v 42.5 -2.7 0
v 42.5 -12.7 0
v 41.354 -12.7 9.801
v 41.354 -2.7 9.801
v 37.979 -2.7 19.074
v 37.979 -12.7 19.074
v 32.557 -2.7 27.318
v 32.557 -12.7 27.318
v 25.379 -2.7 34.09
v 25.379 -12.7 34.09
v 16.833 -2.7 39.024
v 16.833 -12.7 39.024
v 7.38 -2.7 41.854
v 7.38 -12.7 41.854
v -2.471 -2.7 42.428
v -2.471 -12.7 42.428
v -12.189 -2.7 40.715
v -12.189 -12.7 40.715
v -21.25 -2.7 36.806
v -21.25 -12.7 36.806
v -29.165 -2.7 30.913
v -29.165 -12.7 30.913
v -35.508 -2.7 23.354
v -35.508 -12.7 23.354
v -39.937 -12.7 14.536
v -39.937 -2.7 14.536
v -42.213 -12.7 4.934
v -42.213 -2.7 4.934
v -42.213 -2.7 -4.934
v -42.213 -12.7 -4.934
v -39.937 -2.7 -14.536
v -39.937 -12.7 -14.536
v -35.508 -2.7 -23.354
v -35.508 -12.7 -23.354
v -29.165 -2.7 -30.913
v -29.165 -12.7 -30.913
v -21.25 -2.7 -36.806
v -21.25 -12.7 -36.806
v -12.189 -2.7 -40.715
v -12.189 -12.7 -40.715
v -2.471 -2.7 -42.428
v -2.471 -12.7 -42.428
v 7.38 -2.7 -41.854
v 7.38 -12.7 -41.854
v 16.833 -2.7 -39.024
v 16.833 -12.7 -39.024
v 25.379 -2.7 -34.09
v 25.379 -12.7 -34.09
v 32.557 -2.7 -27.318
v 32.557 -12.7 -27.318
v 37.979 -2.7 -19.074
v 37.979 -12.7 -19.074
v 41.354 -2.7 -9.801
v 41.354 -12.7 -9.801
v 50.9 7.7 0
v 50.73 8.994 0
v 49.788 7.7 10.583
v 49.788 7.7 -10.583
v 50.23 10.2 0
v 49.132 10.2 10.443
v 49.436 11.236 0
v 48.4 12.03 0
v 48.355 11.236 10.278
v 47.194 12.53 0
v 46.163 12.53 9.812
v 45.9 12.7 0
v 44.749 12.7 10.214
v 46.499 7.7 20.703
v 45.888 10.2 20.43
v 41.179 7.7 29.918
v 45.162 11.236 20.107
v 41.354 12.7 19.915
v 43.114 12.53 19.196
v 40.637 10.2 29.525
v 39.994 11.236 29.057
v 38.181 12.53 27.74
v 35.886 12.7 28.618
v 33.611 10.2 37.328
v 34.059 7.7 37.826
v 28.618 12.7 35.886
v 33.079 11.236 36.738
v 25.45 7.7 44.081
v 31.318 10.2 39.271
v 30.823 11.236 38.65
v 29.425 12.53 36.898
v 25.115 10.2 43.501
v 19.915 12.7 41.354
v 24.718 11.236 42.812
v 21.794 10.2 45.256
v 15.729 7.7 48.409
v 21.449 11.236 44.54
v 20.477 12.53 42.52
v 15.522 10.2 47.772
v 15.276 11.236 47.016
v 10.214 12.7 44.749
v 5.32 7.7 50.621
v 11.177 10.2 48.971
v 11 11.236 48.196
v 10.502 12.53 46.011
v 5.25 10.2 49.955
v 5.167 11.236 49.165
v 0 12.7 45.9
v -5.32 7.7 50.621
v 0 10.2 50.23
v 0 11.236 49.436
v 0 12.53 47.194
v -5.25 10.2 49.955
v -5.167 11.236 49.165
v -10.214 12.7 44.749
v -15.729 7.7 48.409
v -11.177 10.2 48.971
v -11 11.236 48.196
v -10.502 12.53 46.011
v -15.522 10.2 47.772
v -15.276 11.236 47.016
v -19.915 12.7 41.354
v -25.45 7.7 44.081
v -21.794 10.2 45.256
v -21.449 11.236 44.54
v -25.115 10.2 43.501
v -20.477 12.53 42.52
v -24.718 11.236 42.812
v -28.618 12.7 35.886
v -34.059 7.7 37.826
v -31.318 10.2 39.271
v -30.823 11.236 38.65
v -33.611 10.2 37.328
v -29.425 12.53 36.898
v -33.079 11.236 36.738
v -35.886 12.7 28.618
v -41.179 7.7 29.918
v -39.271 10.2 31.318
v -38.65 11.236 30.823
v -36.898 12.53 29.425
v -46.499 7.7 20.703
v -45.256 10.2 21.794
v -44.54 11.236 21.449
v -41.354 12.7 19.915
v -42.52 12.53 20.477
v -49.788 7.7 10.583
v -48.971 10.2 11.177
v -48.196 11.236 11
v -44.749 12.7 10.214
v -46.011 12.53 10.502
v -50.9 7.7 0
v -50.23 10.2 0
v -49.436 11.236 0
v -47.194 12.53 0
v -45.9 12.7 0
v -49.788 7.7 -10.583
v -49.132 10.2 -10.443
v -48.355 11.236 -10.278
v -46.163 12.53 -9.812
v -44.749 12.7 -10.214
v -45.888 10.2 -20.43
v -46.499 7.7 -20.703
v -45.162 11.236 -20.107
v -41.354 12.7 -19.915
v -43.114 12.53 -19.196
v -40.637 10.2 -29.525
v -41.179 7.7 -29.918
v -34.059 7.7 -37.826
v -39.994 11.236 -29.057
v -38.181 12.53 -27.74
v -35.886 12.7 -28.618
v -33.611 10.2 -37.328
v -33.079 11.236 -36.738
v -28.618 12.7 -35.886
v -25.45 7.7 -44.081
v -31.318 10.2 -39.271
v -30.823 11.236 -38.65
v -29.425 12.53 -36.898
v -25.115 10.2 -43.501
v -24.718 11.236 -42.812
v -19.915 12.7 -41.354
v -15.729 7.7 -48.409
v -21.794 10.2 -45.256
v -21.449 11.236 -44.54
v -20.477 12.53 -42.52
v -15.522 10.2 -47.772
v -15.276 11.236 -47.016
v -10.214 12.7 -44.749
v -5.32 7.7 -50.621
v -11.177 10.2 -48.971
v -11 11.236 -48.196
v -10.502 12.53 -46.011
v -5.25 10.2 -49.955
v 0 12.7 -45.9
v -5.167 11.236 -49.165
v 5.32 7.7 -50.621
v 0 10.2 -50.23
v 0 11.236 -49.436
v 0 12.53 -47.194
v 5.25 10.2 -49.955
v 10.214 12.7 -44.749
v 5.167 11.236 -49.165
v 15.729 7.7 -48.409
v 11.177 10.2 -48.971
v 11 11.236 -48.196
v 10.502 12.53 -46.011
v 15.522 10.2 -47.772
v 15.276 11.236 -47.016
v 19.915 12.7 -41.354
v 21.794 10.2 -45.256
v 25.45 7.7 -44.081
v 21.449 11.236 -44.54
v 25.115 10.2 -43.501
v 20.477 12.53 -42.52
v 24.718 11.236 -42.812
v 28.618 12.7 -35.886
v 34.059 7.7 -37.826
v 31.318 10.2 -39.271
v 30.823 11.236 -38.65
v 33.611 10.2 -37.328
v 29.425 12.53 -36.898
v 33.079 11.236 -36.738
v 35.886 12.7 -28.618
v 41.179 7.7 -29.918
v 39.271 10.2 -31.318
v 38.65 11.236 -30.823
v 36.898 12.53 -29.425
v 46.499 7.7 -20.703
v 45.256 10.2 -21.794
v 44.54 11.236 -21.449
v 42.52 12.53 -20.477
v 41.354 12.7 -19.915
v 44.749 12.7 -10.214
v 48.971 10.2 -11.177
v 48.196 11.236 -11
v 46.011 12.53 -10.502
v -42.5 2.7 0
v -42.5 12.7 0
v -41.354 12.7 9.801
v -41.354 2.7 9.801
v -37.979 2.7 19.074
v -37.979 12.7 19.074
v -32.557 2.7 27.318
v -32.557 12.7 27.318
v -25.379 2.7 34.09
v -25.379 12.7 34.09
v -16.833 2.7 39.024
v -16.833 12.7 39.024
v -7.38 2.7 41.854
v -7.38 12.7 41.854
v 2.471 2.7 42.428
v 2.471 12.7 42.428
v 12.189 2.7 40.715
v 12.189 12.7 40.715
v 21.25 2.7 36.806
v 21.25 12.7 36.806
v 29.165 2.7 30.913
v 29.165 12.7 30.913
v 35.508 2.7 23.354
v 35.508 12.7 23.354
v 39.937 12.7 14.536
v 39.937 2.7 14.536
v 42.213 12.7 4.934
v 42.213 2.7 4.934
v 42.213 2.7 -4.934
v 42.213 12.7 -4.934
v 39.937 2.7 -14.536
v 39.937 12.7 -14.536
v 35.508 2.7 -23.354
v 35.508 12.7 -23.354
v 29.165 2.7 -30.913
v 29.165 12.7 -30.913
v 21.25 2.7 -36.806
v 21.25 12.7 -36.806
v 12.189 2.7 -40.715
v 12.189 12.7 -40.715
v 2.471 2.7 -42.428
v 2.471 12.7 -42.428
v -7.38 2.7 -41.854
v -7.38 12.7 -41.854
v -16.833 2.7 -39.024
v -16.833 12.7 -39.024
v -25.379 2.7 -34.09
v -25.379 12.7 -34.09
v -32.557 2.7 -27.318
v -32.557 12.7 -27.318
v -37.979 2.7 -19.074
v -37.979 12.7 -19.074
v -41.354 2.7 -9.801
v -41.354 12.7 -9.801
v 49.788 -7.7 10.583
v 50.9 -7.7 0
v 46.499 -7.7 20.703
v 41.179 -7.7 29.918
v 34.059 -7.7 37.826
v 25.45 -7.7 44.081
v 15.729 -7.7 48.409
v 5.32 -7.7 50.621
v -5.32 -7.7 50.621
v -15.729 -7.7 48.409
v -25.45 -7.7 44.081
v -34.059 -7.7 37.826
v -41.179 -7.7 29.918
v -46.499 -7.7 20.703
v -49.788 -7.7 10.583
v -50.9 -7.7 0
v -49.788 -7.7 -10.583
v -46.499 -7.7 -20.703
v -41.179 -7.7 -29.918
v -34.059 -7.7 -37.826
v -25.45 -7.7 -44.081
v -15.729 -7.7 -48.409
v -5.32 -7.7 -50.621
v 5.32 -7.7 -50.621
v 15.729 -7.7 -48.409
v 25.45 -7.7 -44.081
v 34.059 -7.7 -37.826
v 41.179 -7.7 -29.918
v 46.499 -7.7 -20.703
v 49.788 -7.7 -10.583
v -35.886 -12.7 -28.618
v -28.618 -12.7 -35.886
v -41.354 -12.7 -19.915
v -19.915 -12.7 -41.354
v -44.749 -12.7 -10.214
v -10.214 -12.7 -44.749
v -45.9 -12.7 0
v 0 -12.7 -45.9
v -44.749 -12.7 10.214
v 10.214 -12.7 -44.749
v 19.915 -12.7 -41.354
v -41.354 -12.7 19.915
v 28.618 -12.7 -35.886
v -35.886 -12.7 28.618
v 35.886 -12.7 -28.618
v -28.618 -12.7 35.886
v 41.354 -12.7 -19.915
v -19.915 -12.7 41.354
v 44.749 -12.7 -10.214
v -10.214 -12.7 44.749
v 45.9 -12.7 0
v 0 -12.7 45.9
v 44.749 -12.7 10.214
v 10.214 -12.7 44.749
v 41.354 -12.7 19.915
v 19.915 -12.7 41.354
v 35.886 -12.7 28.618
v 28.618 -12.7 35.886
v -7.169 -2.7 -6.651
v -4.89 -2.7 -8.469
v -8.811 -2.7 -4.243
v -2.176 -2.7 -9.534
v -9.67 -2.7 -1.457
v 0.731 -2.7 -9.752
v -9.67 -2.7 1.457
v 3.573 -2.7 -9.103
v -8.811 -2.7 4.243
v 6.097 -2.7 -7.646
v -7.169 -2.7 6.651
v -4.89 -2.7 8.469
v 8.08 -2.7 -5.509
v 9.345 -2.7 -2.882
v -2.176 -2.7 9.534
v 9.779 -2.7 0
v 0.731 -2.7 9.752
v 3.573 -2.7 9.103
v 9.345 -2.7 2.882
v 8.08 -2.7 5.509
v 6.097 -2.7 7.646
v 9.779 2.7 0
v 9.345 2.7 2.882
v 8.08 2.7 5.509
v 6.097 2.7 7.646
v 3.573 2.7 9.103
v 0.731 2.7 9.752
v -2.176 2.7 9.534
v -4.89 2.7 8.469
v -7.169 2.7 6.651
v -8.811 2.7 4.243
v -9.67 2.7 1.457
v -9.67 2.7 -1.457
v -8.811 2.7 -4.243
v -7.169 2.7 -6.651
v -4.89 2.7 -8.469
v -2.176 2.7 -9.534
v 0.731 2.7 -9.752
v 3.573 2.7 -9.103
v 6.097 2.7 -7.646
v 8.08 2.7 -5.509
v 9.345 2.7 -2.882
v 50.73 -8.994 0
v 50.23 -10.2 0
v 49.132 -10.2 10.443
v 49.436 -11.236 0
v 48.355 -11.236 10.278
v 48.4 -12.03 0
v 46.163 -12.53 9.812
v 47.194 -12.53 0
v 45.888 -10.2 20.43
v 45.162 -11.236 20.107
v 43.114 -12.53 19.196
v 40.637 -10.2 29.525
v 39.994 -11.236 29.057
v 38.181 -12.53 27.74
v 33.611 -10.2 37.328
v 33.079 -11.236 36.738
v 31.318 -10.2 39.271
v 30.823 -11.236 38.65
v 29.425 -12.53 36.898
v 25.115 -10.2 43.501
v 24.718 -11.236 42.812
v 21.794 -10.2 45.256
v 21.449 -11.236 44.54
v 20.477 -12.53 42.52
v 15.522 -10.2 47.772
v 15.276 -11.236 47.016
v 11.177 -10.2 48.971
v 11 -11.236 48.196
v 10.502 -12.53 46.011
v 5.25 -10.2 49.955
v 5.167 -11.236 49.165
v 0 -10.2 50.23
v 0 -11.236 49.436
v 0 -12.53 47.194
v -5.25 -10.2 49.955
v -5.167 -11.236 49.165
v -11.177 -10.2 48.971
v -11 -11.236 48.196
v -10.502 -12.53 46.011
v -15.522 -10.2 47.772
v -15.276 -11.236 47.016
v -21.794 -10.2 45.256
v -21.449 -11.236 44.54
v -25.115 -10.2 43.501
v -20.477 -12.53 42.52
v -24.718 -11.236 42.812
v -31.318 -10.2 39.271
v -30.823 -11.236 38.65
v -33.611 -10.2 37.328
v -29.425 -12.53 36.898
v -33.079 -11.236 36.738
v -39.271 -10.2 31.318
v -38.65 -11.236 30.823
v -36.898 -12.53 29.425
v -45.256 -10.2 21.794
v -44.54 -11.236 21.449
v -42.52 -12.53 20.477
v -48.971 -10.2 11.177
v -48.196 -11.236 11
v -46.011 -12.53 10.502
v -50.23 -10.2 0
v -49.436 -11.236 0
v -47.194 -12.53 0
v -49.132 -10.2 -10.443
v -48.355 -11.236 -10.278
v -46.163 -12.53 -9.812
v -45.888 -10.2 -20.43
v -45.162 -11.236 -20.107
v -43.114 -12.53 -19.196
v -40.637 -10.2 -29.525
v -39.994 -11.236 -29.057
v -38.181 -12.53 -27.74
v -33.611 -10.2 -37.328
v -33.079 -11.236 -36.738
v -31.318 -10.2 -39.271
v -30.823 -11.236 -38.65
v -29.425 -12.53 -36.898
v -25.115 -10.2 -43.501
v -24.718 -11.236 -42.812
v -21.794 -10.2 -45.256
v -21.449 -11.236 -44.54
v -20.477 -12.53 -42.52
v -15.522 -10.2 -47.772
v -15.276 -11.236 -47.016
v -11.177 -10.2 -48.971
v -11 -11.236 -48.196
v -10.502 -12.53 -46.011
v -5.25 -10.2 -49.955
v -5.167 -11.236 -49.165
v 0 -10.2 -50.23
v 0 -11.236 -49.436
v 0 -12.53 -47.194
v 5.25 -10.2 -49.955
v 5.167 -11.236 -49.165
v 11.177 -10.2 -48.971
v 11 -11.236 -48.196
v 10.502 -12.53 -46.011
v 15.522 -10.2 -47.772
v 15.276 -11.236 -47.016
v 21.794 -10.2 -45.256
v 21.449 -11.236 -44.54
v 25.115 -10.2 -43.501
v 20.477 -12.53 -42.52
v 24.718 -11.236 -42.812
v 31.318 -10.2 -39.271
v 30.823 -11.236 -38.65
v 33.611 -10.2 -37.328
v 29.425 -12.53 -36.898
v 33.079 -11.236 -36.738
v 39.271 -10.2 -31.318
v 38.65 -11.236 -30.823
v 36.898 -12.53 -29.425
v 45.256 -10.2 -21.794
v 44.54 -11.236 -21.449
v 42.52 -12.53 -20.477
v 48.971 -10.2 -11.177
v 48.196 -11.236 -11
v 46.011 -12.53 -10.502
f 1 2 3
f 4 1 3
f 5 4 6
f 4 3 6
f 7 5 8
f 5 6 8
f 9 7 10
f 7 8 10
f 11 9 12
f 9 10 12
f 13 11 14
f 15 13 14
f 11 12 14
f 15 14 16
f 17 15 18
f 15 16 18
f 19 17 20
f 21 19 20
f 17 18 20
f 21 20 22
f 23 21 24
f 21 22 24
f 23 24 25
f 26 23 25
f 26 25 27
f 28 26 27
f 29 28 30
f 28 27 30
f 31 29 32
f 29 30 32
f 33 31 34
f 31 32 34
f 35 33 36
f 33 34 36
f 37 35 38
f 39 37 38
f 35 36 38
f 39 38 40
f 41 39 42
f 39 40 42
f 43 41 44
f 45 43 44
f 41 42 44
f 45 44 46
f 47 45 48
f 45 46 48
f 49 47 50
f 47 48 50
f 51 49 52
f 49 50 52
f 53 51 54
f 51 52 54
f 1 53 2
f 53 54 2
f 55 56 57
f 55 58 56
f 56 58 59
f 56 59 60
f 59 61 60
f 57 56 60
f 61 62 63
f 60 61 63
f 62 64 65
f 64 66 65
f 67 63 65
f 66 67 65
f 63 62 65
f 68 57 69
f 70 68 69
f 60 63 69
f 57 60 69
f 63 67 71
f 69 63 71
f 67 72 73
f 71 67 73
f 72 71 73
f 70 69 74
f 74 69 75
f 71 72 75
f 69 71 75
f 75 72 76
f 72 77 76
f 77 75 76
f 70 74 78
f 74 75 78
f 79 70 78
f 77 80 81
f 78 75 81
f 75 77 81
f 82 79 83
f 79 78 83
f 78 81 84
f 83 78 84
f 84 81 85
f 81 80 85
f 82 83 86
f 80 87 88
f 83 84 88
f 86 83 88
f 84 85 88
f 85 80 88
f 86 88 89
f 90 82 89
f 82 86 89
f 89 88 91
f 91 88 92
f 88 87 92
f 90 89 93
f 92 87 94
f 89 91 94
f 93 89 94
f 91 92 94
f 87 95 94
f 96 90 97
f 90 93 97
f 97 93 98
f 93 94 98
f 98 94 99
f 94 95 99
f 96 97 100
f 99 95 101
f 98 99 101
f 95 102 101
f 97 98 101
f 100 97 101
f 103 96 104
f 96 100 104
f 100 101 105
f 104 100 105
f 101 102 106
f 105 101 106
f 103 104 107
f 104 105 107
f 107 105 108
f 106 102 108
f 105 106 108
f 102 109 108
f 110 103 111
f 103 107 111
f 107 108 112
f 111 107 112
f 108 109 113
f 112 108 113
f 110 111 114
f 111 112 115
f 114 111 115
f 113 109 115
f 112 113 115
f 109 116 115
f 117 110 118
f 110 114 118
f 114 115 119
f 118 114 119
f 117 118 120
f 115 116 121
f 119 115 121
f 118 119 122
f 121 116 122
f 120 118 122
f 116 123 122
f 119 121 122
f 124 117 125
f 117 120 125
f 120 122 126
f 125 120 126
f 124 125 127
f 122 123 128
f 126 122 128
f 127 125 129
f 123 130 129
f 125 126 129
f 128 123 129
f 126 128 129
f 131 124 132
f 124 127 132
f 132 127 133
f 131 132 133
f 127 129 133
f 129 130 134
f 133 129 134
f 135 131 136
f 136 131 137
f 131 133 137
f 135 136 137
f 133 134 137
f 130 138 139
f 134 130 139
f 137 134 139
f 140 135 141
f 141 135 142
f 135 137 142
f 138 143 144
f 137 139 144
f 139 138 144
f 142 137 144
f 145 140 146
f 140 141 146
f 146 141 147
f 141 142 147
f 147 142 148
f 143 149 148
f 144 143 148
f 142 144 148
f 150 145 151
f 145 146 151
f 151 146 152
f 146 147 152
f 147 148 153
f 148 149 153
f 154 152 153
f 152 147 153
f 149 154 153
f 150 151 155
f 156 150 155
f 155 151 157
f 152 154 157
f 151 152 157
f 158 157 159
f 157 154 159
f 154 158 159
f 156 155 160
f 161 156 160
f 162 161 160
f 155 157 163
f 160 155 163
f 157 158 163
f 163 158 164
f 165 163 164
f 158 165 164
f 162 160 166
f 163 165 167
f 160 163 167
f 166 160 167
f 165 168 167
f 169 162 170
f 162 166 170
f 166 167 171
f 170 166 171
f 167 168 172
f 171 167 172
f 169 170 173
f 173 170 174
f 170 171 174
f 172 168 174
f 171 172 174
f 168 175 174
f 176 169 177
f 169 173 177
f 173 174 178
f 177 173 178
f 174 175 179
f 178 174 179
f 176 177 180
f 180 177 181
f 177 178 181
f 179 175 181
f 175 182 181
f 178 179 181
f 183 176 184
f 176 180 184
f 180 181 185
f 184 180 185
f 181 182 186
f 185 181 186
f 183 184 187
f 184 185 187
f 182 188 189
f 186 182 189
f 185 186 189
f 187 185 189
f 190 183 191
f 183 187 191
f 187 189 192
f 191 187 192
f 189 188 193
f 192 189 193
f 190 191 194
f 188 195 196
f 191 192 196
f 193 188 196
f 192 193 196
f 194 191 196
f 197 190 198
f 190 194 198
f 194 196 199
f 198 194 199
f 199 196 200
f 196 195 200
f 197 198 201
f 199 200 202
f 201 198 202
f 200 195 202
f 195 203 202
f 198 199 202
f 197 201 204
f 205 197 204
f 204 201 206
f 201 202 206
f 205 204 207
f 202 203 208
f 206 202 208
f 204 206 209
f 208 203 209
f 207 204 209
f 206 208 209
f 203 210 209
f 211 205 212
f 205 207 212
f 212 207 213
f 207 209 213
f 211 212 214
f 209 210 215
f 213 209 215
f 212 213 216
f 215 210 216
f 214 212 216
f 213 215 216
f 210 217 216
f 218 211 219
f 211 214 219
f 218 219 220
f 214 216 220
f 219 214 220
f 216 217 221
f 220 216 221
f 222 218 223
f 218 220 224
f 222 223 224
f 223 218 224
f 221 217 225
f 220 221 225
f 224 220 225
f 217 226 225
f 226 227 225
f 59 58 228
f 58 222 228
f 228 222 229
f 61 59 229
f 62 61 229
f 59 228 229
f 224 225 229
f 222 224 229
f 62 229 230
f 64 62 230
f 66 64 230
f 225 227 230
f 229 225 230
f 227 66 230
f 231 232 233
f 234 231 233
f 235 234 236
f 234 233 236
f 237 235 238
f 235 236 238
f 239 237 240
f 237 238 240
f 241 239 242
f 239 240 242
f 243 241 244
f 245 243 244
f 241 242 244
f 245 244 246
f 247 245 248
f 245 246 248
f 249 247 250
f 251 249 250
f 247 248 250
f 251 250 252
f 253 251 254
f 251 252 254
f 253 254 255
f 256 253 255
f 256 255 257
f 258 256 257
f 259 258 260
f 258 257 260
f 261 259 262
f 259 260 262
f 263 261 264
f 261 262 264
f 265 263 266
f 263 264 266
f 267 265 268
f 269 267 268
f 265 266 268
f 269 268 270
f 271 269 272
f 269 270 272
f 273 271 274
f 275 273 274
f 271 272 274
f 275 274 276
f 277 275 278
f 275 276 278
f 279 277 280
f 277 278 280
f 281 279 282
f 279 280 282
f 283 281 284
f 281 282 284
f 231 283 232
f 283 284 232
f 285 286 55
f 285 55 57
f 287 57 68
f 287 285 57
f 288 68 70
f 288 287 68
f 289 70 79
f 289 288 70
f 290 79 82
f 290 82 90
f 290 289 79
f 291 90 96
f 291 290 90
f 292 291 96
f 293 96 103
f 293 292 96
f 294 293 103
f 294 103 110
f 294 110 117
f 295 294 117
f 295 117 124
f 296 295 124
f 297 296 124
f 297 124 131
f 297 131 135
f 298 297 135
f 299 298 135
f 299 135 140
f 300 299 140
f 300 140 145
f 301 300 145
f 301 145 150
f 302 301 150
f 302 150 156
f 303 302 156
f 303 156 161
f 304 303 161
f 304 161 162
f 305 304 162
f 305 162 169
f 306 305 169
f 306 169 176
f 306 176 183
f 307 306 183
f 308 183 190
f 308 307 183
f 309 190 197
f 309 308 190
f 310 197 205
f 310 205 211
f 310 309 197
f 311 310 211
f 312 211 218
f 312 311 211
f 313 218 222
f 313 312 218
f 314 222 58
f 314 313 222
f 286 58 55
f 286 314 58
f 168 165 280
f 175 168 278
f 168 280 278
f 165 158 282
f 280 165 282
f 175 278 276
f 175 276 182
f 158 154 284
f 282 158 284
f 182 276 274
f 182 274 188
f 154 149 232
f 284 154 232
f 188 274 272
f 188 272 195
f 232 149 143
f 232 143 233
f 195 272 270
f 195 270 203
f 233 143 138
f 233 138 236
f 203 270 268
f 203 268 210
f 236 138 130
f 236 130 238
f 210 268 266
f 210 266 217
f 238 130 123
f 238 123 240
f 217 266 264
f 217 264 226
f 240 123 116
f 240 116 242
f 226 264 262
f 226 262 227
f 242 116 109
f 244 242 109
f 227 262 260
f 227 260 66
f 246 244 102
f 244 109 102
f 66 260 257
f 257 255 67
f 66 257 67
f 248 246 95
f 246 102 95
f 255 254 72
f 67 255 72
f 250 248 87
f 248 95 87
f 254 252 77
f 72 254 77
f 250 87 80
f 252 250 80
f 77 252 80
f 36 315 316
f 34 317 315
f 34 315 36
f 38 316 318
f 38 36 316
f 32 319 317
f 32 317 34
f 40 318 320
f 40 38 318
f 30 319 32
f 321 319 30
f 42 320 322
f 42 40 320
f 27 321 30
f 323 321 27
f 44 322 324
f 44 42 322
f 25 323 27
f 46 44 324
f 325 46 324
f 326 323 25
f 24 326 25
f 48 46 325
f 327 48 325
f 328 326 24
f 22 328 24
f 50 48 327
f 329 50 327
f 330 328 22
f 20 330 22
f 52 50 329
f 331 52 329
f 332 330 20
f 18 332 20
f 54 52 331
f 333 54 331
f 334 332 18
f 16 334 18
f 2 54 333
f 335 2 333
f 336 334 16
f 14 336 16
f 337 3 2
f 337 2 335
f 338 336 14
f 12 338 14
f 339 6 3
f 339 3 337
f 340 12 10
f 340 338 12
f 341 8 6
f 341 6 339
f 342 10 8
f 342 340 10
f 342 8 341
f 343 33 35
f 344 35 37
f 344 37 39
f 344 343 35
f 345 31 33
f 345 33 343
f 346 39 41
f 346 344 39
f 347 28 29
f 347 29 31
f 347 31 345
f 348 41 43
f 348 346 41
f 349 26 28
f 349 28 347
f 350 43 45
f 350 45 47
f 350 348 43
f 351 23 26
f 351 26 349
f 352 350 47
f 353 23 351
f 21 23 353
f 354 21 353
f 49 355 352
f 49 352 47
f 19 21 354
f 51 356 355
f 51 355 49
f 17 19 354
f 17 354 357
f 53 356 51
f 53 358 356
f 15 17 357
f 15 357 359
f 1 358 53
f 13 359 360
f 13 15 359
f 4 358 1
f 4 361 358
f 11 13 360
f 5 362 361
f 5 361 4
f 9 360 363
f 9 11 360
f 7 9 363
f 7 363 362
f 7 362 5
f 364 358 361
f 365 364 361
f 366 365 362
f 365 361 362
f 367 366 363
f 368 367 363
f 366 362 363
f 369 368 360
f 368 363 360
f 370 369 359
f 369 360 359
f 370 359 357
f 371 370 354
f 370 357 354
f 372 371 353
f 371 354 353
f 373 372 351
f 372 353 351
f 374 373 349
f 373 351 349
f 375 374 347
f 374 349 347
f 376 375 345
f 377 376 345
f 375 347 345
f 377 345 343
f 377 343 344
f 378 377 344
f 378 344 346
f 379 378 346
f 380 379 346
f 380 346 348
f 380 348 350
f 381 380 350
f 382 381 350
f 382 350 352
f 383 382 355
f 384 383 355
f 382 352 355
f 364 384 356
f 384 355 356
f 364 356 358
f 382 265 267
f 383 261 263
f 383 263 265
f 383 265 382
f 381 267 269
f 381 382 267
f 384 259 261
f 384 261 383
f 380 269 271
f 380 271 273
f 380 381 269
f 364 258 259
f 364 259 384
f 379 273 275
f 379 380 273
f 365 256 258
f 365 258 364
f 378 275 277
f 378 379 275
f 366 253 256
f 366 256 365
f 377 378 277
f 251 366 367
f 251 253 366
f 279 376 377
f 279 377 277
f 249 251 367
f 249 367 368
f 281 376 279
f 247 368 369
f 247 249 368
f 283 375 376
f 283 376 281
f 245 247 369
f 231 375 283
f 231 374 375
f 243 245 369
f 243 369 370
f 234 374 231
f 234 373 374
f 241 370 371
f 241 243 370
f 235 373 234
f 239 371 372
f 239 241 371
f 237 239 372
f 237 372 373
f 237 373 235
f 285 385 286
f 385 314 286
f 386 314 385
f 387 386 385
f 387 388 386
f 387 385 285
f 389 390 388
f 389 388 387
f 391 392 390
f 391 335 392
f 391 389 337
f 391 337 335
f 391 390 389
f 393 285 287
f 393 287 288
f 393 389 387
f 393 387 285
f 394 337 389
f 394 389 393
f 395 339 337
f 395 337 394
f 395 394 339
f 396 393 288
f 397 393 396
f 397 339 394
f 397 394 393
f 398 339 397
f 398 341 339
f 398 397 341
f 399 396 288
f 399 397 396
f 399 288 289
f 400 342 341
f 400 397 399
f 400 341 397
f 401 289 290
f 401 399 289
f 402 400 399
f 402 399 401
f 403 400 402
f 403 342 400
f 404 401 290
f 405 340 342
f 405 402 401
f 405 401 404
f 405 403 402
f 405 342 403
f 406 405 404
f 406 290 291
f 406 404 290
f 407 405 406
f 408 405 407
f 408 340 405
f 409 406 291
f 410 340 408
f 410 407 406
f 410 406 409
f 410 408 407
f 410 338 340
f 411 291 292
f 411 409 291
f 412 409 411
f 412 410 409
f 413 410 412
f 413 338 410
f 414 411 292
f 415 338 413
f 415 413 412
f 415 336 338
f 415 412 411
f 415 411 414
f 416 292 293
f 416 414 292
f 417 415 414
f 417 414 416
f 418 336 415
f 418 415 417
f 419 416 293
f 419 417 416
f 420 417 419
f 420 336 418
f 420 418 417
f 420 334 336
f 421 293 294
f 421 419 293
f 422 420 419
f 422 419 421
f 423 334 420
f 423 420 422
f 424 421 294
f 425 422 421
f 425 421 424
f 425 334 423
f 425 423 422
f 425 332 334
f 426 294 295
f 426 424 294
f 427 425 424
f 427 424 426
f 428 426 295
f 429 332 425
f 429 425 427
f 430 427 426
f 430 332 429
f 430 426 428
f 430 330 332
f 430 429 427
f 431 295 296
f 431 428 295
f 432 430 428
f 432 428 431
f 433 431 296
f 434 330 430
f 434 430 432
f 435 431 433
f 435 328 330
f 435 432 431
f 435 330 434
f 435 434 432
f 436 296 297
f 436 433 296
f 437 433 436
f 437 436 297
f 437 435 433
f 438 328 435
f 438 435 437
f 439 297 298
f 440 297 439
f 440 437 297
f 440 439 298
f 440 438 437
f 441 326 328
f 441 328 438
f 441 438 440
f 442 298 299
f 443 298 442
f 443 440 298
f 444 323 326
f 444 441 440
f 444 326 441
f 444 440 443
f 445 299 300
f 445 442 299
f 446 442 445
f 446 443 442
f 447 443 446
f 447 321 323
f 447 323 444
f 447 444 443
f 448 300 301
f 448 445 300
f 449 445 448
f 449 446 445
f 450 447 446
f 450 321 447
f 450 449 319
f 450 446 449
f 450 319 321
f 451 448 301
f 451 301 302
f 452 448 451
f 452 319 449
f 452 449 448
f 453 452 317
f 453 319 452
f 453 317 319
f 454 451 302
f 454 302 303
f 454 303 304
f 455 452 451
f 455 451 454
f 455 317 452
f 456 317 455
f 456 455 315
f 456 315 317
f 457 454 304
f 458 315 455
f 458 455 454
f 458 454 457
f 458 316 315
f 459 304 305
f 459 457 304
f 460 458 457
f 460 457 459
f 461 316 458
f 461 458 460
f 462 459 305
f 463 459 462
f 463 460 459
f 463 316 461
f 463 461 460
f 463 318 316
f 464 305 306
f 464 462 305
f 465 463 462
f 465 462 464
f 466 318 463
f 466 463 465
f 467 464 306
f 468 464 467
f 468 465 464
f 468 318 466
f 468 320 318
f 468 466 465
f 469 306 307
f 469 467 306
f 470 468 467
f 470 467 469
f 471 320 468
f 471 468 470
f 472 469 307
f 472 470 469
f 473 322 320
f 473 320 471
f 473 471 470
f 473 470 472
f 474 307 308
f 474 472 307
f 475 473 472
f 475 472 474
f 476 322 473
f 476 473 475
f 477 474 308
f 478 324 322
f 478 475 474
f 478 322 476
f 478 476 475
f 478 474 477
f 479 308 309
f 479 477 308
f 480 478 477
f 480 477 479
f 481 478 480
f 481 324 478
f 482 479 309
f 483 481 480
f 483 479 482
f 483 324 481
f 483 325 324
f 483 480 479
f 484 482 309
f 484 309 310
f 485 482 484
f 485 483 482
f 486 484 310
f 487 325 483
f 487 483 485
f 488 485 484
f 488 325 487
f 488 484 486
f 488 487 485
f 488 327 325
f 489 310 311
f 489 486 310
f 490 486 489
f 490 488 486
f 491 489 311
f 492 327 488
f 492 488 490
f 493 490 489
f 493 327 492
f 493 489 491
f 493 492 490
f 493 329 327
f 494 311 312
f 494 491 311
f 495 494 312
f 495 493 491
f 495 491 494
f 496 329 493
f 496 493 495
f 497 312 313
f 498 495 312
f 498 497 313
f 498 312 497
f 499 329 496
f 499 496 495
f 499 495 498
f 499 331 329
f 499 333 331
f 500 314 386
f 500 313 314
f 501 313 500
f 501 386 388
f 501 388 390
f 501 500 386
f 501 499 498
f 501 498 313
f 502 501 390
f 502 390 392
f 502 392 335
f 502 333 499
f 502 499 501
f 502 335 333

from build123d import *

# Parameters (mm, degrees)
F0_R     = 50.9
F0_R_2   = 40.9
F1_DEPTH = 12.7
F2_R     = 5
F3_R     = 42.5
F4_DEPTH = 10
F5_R     = 42.5
F6_DEPTH = 10
F7_R     = 9.779
F8_DEPTH = 5.4


with BuildPart() as f1:
    # F0 (on Front) → F1 (new body, symmetric)
    with BuildSketch(Plane.XZ):
        Circle(F0_R)
        Circle(F0_R_2, mode=Mode.SUBTRACT)
        Circle(F0_R_2)
    extrude(amount=F1_DEPTH, both=True)

    # F2
    f2_edges = [f1.edges().sort_by_distance(p)[0] for p in [
        (-50.9, -12.7, 0),
        (-50.9, 12.7, 0),
    ]]
    fillet(f2_edges, radius=F2_R)

    # F3 (on face) → F4 (cut)
    with BuildSketch(Plane.XZ.offset(12.7)):
        Circle(F3_R)
    extrude(amount=-F4_DEPTH, mode=Mode.SUBTRACT)

    # F5 (on face) → F6 (cut)
    with BuildSketch(Plane(origin=(0, 12.7, 0), x_dir=(-1, 0, 0), z_dir=(0, 1, 0))):
        Circle(F5_R)
    extrude(amount=-F6_DEPTH, mode=Mode.SUBTRACT)

    # F7 (on face) → F8 (cut, through all)
    with BuildSketch(Plane.XZ.offset(2.7)):
        Circle(F7_R)
    extrude(amount=-F8_DEPTH, mode=Mode.SUBTRACT)


solid = f1.part
